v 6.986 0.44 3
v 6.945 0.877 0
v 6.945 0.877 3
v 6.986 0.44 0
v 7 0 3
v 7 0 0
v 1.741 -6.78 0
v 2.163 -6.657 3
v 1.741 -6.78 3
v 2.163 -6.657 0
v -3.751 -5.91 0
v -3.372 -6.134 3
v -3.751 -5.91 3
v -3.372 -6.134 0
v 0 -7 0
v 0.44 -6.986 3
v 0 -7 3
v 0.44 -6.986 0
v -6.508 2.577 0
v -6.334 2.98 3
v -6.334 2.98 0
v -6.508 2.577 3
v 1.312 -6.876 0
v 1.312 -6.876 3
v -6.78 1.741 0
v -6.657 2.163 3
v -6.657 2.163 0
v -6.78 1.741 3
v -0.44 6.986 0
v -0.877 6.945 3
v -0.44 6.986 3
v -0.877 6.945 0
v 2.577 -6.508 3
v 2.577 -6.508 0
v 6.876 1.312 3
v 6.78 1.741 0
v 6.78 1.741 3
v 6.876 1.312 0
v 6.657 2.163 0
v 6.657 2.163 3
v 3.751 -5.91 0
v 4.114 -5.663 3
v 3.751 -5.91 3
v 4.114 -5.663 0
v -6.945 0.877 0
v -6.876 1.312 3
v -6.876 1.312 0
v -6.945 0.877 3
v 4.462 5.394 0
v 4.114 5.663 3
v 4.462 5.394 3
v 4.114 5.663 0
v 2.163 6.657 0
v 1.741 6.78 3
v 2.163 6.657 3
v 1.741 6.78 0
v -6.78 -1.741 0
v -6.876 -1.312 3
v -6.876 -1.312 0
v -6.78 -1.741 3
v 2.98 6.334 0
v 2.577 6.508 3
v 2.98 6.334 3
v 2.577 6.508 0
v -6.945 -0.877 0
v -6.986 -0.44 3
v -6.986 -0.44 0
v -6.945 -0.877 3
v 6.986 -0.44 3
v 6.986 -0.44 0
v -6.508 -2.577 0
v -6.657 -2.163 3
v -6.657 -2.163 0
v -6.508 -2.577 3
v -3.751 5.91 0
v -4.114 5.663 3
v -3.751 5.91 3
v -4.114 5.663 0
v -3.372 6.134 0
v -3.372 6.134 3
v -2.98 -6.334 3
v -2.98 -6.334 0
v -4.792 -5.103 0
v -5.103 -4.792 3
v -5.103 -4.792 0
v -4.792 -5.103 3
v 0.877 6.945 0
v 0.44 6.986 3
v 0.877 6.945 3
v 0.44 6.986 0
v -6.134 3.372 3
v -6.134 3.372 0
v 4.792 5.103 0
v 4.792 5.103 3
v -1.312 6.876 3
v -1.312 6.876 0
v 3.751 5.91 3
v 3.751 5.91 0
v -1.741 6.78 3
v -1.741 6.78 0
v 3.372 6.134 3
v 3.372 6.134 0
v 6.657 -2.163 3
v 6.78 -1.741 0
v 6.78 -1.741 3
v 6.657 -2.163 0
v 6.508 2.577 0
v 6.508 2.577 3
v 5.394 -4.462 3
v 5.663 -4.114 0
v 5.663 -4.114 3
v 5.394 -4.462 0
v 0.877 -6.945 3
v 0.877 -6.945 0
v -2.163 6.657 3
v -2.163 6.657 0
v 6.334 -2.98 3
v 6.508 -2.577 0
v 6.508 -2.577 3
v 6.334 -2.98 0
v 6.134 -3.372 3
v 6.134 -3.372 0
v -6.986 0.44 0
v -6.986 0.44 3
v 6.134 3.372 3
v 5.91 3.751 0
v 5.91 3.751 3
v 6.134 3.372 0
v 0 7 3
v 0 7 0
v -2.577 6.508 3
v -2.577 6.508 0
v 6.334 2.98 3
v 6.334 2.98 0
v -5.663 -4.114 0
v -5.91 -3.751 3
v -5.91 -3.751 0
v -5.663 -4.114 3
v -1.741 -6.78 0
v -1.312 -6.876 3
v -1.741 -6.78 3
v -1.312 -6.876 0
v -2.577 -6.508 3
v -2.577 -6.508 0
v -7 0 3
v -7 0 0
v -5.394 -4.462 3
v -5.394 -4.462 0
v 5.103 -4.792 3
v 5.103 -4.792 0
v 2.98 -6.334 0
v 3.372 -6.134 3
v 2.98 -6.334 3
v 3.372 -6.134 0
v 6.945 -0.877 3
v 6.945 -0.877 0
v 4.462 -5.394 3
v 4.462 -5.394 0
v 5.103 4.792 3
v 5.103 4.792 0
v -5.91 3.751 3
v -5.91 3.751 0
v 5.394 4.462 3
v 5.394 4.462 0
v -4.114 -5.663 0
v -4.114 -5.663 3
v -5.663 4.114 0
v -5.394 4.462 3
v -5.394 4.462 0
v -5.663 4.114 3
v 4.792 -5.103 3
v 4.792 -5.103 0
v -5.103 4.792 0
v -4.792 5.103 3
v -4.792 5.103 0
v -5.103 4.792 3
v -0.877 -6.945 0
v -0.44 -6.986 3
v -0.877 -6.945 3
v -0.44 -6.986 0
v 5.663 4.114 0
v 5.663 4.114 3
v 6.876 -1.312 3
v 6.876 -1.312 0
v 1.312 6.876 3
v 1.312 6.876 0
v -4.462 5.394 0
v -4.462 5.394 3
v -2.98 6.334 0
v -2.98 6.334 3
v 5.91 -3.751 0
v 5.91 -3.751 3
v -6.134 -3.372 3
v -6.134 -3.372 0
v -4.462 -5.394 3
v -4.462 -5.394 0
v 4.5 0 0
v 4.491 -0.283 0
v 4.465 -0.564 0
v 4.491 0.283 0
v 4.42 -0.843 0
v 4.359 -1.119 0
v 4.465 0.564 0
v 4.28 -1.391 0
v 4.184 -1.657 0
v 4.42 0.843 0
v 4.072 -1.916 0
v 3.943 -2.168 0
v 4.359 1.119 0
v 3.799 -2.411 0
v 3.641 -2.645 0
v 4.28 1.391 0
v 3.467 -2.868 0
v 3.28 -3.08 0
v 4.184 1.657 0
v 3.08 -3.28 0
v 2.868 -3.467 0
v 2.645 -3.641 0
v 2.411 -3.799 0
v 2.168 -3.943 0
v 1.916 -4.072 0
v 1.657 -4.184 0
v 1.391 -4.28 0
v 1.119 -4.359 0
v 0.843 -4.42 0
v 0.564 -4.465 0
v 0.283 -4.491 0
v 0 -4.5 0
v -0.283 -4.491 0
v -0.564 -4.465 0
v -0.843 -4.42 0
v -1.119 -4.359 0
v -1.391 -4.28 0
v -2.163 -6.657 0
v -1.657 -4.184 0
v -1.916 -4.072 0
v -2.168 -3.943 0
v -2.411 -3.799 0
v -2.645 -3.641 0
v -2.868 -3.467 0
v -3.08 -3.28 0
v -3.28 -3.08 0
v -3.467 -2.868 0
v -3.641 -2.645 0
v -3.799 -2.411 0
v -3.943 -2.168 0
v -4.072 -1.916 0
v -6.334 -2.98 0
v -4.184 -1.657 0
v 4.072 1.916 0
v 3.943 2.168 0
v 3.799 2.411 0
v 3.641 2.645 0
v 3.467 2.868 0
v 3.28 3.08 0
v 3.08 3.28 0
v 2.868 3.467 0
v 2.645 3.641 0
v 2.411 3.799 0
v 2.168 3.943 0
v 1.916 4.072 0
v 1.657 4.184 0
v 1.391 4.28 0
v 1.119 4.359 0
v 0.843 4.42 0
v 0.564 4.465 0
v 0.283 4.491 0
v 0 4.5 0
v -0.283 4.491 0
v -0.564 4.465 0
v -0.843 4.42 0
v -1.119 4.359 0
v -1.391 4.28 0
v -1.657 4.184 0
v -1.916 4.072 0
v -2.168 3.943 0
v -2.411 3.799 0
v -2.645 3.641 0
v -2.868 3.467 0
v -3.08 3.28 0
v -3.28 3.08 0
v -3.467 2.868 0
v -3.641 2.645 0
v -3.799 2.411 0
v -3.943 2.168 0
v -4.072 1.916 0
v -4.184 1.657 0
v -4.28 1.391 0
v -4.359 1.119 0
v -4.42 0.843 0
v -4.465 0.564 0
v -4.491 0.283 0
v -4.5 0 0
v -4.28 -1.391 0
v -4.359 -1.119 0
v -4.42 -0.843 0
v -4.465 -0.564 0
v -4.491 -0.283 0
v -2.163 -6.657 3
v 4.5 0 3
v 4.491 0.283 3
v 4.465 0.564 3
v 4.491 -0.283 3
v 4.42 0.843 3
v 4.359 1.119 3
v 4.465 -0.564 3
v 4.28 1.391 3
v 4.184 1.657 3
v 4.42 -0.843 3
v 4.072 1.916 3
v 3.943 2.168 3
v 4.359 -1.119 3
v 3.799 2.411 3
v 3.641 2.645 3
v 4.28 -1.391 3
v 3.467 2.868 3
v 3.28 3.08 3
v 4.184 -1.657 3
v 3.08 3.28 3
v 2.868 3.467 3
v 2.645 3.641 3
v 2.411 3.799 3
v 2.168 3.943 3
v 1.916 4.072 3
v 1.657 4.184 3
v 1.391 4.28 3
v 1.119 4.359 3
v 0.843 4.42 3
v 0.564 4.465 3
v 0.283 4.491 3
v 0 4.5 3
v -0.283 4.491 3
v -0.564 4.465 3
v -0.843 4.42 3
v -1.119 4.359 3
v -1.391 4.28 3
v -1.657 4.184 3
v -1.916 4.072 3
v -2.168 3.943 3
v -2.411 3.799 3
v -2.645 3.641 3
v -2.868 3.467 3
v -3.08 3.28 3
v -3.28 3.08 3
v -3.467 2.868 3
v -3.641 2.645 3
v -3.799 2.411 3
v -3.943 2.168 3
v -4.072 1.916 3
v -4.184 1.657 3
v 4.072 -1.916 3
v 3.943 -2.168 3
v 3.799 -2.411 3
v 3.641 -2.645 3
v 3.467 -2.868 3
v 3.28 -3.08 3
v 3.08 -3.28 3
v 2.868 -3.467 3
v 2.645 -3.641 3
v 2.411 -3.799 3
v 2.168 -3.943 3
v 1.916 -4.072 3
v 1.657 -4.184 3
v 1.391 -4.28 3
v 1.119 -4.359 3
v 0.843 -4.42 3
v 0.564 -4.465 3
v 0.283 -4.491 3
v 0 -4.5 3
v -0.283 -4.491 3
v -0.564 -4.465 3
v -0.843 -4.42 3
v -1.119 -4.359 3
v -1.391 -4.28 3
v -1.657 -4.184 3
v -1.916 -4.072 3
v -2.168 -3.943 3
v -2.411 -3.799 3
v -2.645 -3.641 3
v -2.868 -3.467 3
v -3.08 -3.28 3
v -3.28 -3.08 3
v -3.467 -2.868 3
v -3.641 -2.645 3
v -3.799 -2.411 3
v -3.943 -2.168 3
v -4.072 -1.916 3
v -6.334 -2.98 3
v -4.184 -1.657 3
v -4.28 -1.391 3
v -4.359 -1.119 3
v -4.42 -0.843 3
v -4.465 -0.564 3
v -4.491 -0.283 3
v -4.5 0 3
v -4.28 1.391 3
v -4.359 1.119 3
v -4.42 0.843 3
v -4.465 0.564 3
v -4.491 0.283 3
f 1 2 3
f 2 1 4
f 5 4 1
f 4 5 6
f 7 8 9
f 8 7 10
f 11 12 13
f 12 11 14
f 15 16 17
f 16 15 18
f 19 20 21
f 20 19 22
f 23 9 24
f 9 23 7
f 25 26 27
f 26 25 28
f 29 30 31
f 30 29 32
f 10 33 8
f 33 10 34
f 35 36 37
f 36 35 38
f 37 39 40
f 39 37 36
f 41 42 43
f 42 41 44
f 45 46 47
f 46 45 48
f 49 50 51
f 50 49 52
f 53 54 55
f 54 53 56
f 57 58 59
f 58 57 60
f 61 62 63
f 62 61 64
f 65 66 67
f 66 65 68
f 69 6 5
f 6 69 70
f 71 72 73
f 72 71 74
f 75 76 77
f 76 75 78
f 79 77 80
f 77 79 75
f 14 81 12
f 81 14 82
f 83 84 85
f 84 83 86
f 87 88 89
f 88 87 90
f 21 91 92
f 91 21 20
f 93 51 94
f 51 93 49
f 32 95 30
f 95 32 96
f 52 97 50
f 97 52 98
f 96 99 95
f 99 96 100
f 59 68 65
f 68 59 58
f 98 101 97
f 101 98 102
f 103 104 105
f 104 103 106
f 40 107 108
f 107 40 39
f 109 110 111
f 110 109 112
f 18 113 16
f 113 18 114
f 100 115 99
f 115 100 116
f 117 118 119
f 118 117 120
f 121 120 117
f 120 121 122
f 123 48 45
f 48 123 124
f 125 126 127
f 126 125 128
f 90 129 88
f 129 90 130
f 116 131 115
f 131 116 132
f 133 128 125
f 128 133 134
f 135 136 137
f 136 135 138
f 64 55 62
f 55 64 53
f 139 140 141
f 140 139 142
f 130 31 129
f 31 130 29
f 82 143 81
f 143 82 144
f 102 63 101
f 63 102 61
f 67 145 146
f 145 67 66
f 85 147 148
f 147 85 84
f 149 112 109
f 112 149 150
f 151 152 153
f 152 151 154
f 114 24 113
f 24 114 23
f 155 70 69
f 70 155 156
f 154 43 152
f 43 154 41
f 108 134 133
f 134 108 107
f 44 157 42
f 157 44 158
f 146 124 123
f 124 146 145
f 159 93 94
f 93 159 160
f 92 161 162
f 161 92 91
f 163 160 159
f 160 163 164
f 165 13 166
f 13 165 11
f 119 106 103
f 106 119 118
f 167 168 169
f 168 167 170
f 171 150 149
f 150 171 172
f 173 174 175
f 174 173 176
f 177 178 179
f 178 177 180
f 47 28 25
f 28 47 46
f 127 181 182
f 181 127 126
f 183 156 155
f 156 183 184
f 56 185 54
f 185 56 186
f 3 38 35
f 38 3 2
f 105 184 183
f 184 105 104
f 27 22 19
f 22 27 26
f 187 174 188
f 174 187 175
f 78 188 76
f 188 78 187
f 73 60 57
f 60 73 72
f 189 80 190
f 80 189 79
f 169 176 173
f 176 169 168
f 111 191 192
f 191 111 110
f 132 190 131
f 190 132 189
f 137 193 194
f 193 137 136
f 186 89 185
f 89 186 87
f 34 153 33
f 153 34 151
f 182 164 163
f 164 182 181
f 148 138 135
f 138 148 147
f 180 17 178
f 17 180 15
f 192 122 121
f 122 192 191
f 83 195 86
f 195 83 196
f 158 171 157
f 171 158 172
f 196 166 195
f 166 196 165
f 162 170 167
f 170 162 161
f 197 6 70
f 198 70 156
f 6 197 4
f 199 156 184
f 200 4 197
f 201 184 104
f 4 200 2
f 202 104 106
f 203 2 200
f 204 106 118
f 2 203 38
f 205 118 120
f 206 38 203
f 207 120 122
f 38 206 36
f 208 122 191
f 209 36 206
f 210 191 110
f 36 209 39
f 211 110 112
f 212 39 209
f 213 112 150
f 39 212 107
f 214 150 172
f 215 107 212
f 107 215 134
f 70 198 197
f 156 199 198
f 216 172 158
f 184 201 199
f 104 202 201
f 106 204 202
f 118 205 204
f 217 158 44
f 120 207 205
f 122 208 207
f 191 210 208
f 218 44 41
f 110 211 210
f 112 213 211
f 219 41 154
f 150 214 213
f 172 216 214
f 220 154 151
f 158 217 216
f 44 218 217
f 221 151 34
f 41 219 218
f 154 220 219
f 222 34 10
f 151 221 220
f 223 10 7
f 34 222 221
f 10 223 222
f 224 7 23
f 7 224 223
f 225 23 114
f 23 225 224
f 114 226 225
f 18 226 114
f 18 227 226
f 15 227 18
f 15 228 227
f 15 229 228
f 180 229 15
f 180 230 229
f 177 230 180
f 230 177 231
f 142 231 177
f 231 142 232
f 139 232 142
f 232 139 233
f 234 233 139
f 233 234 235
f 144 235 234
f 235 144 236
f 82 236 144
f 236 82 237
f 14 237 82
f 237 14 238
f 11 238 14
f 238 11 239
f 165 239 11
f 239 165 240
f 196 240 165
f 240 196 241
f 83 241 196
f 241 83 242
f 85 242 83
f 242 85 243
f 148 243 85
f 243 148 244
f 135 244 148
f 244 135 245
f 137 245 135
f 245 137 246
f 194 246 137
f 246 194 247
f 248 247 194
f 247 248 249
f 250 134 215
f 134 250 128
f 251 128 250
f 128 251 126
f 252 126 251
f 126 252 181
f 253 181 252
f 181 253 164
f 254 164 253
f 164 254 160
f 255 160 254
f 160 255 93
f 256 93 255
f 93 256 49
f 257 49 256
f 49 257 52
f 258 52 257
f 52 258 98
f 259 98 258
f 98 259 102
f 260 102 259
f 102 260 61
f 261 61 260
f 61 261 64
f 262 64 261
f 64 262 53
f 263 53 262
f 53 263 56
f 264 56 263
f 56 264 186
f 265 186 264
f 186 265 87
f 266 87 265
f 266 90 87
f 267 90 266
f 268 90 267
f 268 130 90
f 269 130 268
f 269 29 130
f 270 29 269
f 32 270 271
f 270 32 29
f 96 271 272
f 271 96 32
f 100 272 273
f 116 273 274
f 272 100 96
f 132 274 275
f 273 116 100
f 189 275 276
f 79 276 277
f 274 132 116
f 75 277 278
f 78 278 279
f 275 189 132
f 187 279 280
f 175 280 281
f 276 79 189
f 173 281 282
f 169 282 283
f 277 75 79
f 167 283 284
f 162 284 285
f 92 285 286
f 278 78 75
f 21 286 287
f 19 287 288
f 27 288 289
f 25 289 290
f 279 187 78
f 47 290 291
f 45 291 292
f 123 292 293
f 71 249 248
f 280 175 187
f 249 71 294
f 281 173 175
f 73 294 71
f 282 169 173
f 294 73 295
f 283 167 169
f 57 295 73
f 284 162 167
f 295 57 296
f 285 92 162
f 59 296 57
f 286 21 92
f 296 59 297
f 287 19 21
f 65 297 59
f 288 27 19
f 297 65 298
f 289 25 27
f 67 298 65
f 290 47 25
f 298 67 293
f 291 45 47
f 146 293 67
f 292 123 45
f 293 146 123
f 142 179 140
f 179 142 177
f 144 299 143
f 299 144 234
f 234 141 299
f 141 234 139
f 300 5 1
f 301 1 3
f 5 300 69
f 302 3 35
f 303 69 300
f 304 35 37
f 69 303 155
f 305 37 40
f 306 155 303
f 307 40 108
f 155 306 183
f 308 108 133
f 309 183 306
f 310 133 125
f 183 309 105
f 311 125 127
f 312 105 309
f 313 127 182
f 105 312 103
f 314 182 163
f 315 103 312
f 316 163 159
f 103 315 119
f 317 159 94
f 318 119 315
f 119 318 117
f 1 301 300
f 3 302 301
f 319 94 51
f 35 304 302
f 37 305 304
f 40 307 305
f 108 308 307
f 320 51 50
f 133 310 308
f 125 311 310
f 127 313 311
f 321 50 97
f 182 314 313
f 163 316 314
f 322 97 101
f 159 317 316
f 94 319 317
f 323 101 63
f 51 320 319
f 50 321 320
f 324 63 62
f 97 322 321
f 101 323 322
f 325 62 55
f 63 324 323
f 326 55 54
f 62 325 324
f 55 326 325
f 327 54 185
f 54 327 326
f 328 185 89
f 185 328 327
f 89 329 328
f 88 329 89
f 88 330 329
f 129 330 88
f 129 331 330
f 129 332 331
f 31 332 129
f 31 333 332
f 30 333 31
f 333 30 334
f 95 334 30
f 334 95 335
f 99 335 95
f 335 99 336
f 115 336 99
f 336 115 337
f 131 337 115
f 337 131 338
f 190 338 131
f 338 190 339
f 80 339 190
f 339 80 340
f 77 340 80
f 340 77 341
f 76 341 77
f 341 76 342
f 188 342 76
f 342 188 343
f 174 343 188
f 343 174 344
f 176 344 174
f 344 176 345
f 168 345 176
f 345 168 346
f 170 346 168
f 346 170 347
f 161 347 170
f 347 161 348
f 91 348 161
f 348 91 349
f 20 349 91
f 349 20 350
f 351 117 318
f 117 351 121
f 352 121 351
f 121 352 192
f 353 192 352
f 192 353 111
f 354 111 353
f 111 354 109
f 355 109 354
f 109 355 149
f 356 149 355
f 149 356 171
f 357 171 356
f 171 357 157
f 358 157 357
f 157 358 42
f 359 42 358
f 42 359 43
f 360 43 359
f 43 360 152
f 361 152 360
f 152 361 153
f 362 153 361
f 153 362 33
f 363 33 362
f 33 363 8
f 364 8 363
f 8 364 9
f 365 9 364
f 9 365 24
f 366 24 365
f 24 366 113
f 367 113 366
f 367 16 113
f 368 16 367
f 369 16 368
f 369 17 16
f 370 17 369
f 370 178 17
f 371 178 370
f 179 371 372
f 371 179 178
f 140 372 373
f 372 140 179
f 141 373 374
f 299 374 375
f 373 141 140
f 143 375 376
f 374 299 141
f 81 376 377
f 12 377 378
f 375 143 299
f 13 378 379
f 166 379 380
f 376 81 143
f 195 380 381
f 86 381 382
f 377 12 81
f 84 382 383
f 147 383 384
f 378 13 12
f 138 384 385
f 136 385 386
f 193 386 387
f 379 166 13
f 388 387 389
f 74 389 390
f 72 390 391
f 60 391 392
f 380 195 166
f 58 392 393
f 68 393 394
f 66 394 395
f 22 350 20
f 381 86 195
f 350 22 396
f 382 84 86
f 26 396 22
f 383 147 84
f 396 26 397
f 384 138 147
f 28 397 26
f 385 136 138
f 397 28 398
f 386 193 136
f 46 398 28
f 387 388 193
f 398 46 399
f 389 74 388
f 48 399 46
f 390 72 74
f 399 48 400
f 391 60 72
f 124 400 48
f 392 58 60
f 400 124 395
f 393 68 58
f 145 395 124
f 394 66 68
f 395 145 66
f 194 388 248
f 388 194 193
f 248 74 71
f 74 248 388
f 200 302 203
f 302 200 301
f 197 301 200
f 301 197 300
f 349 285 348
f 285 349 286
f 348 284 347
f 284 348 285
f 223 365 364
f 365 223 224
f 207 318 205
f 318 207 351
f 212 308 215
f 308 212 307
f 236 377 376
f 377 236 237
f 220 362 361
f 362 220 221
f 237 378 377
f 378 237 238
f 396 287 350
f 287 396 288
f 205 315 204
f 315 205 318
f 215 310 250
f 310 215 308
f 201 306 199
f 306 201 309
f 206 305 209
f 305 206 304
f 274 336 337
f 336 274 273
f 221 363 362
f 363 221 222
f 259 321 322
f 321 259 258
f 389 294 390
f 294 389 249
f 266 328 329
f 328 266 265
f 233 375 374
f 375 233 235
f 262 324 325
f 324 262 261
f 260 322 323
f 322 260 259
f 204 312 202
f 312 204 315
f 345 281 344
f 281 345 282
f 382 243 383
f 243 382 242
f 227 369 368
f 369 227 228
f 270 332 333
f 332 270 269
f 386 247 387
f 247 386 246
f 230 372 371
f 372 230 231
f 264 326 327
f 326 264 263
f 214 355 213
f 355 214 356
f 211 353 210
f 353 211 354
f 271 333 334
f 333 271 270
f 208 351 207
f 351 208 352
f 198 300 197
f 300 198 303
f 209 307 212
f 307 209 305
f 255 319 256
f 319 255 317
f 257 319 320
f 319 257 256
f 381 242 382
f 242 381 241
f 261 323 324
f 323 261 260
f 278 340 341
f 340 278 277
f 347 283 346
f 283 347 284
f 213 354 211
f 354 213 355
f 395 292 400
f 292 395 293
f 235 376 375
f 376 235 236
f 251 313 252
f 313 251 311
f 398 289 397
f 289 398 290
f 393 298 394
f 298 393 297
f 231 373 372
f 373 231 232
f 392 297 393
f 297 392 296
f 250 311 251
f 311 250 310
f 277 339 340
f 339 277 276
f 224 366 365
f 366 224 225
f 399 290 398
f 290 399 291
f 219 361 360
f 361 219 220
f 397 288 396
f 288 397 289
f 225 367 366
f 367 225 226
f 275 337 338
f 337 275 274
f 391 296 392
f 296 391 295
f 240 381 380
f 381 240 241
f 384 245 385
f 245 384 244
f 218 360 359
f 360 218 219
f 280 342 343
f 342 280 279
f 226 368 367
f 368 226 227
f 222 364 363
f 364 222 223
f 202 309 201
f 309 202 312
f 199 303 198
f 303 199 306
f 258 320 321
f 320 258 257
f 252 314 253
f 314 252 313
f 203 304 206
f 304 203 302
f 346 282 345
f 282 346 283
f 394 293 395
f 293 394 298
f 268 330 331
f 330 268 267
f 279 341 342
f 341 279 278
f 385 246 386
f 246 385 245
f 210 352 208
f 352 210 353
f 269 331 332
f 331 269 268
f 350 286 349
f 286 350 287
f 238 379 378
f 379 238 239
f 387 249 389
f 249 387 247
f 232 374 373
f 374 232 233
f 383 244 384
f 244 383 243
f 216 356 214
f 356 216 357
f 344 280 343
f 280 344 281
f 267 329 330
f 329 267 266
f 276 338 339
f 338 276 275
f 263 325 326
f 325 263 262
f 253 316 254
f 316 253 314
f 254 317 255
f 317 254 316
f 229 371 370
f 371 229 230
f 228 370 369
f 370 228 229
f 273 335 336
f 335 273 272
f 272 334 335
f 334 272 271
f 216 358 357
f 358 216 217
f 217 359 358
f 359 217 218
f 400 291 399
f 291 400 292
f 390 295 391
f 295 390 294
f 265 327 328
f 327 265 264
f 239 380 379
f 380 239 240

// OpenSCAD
openCylinder();

module openCylinder(height = 3,
                    outerRadius = 7,
                    innerRadius = 4.5,
                    fn = 100)
{
    $fn = fn;
        
    difference()
    {
        cylinder(r=outerRadius,
                 h=height);
                
        translate([0, 0, -1])
        cylinder(r=innerRadius,
                 h=height+1.01);
    }
}
